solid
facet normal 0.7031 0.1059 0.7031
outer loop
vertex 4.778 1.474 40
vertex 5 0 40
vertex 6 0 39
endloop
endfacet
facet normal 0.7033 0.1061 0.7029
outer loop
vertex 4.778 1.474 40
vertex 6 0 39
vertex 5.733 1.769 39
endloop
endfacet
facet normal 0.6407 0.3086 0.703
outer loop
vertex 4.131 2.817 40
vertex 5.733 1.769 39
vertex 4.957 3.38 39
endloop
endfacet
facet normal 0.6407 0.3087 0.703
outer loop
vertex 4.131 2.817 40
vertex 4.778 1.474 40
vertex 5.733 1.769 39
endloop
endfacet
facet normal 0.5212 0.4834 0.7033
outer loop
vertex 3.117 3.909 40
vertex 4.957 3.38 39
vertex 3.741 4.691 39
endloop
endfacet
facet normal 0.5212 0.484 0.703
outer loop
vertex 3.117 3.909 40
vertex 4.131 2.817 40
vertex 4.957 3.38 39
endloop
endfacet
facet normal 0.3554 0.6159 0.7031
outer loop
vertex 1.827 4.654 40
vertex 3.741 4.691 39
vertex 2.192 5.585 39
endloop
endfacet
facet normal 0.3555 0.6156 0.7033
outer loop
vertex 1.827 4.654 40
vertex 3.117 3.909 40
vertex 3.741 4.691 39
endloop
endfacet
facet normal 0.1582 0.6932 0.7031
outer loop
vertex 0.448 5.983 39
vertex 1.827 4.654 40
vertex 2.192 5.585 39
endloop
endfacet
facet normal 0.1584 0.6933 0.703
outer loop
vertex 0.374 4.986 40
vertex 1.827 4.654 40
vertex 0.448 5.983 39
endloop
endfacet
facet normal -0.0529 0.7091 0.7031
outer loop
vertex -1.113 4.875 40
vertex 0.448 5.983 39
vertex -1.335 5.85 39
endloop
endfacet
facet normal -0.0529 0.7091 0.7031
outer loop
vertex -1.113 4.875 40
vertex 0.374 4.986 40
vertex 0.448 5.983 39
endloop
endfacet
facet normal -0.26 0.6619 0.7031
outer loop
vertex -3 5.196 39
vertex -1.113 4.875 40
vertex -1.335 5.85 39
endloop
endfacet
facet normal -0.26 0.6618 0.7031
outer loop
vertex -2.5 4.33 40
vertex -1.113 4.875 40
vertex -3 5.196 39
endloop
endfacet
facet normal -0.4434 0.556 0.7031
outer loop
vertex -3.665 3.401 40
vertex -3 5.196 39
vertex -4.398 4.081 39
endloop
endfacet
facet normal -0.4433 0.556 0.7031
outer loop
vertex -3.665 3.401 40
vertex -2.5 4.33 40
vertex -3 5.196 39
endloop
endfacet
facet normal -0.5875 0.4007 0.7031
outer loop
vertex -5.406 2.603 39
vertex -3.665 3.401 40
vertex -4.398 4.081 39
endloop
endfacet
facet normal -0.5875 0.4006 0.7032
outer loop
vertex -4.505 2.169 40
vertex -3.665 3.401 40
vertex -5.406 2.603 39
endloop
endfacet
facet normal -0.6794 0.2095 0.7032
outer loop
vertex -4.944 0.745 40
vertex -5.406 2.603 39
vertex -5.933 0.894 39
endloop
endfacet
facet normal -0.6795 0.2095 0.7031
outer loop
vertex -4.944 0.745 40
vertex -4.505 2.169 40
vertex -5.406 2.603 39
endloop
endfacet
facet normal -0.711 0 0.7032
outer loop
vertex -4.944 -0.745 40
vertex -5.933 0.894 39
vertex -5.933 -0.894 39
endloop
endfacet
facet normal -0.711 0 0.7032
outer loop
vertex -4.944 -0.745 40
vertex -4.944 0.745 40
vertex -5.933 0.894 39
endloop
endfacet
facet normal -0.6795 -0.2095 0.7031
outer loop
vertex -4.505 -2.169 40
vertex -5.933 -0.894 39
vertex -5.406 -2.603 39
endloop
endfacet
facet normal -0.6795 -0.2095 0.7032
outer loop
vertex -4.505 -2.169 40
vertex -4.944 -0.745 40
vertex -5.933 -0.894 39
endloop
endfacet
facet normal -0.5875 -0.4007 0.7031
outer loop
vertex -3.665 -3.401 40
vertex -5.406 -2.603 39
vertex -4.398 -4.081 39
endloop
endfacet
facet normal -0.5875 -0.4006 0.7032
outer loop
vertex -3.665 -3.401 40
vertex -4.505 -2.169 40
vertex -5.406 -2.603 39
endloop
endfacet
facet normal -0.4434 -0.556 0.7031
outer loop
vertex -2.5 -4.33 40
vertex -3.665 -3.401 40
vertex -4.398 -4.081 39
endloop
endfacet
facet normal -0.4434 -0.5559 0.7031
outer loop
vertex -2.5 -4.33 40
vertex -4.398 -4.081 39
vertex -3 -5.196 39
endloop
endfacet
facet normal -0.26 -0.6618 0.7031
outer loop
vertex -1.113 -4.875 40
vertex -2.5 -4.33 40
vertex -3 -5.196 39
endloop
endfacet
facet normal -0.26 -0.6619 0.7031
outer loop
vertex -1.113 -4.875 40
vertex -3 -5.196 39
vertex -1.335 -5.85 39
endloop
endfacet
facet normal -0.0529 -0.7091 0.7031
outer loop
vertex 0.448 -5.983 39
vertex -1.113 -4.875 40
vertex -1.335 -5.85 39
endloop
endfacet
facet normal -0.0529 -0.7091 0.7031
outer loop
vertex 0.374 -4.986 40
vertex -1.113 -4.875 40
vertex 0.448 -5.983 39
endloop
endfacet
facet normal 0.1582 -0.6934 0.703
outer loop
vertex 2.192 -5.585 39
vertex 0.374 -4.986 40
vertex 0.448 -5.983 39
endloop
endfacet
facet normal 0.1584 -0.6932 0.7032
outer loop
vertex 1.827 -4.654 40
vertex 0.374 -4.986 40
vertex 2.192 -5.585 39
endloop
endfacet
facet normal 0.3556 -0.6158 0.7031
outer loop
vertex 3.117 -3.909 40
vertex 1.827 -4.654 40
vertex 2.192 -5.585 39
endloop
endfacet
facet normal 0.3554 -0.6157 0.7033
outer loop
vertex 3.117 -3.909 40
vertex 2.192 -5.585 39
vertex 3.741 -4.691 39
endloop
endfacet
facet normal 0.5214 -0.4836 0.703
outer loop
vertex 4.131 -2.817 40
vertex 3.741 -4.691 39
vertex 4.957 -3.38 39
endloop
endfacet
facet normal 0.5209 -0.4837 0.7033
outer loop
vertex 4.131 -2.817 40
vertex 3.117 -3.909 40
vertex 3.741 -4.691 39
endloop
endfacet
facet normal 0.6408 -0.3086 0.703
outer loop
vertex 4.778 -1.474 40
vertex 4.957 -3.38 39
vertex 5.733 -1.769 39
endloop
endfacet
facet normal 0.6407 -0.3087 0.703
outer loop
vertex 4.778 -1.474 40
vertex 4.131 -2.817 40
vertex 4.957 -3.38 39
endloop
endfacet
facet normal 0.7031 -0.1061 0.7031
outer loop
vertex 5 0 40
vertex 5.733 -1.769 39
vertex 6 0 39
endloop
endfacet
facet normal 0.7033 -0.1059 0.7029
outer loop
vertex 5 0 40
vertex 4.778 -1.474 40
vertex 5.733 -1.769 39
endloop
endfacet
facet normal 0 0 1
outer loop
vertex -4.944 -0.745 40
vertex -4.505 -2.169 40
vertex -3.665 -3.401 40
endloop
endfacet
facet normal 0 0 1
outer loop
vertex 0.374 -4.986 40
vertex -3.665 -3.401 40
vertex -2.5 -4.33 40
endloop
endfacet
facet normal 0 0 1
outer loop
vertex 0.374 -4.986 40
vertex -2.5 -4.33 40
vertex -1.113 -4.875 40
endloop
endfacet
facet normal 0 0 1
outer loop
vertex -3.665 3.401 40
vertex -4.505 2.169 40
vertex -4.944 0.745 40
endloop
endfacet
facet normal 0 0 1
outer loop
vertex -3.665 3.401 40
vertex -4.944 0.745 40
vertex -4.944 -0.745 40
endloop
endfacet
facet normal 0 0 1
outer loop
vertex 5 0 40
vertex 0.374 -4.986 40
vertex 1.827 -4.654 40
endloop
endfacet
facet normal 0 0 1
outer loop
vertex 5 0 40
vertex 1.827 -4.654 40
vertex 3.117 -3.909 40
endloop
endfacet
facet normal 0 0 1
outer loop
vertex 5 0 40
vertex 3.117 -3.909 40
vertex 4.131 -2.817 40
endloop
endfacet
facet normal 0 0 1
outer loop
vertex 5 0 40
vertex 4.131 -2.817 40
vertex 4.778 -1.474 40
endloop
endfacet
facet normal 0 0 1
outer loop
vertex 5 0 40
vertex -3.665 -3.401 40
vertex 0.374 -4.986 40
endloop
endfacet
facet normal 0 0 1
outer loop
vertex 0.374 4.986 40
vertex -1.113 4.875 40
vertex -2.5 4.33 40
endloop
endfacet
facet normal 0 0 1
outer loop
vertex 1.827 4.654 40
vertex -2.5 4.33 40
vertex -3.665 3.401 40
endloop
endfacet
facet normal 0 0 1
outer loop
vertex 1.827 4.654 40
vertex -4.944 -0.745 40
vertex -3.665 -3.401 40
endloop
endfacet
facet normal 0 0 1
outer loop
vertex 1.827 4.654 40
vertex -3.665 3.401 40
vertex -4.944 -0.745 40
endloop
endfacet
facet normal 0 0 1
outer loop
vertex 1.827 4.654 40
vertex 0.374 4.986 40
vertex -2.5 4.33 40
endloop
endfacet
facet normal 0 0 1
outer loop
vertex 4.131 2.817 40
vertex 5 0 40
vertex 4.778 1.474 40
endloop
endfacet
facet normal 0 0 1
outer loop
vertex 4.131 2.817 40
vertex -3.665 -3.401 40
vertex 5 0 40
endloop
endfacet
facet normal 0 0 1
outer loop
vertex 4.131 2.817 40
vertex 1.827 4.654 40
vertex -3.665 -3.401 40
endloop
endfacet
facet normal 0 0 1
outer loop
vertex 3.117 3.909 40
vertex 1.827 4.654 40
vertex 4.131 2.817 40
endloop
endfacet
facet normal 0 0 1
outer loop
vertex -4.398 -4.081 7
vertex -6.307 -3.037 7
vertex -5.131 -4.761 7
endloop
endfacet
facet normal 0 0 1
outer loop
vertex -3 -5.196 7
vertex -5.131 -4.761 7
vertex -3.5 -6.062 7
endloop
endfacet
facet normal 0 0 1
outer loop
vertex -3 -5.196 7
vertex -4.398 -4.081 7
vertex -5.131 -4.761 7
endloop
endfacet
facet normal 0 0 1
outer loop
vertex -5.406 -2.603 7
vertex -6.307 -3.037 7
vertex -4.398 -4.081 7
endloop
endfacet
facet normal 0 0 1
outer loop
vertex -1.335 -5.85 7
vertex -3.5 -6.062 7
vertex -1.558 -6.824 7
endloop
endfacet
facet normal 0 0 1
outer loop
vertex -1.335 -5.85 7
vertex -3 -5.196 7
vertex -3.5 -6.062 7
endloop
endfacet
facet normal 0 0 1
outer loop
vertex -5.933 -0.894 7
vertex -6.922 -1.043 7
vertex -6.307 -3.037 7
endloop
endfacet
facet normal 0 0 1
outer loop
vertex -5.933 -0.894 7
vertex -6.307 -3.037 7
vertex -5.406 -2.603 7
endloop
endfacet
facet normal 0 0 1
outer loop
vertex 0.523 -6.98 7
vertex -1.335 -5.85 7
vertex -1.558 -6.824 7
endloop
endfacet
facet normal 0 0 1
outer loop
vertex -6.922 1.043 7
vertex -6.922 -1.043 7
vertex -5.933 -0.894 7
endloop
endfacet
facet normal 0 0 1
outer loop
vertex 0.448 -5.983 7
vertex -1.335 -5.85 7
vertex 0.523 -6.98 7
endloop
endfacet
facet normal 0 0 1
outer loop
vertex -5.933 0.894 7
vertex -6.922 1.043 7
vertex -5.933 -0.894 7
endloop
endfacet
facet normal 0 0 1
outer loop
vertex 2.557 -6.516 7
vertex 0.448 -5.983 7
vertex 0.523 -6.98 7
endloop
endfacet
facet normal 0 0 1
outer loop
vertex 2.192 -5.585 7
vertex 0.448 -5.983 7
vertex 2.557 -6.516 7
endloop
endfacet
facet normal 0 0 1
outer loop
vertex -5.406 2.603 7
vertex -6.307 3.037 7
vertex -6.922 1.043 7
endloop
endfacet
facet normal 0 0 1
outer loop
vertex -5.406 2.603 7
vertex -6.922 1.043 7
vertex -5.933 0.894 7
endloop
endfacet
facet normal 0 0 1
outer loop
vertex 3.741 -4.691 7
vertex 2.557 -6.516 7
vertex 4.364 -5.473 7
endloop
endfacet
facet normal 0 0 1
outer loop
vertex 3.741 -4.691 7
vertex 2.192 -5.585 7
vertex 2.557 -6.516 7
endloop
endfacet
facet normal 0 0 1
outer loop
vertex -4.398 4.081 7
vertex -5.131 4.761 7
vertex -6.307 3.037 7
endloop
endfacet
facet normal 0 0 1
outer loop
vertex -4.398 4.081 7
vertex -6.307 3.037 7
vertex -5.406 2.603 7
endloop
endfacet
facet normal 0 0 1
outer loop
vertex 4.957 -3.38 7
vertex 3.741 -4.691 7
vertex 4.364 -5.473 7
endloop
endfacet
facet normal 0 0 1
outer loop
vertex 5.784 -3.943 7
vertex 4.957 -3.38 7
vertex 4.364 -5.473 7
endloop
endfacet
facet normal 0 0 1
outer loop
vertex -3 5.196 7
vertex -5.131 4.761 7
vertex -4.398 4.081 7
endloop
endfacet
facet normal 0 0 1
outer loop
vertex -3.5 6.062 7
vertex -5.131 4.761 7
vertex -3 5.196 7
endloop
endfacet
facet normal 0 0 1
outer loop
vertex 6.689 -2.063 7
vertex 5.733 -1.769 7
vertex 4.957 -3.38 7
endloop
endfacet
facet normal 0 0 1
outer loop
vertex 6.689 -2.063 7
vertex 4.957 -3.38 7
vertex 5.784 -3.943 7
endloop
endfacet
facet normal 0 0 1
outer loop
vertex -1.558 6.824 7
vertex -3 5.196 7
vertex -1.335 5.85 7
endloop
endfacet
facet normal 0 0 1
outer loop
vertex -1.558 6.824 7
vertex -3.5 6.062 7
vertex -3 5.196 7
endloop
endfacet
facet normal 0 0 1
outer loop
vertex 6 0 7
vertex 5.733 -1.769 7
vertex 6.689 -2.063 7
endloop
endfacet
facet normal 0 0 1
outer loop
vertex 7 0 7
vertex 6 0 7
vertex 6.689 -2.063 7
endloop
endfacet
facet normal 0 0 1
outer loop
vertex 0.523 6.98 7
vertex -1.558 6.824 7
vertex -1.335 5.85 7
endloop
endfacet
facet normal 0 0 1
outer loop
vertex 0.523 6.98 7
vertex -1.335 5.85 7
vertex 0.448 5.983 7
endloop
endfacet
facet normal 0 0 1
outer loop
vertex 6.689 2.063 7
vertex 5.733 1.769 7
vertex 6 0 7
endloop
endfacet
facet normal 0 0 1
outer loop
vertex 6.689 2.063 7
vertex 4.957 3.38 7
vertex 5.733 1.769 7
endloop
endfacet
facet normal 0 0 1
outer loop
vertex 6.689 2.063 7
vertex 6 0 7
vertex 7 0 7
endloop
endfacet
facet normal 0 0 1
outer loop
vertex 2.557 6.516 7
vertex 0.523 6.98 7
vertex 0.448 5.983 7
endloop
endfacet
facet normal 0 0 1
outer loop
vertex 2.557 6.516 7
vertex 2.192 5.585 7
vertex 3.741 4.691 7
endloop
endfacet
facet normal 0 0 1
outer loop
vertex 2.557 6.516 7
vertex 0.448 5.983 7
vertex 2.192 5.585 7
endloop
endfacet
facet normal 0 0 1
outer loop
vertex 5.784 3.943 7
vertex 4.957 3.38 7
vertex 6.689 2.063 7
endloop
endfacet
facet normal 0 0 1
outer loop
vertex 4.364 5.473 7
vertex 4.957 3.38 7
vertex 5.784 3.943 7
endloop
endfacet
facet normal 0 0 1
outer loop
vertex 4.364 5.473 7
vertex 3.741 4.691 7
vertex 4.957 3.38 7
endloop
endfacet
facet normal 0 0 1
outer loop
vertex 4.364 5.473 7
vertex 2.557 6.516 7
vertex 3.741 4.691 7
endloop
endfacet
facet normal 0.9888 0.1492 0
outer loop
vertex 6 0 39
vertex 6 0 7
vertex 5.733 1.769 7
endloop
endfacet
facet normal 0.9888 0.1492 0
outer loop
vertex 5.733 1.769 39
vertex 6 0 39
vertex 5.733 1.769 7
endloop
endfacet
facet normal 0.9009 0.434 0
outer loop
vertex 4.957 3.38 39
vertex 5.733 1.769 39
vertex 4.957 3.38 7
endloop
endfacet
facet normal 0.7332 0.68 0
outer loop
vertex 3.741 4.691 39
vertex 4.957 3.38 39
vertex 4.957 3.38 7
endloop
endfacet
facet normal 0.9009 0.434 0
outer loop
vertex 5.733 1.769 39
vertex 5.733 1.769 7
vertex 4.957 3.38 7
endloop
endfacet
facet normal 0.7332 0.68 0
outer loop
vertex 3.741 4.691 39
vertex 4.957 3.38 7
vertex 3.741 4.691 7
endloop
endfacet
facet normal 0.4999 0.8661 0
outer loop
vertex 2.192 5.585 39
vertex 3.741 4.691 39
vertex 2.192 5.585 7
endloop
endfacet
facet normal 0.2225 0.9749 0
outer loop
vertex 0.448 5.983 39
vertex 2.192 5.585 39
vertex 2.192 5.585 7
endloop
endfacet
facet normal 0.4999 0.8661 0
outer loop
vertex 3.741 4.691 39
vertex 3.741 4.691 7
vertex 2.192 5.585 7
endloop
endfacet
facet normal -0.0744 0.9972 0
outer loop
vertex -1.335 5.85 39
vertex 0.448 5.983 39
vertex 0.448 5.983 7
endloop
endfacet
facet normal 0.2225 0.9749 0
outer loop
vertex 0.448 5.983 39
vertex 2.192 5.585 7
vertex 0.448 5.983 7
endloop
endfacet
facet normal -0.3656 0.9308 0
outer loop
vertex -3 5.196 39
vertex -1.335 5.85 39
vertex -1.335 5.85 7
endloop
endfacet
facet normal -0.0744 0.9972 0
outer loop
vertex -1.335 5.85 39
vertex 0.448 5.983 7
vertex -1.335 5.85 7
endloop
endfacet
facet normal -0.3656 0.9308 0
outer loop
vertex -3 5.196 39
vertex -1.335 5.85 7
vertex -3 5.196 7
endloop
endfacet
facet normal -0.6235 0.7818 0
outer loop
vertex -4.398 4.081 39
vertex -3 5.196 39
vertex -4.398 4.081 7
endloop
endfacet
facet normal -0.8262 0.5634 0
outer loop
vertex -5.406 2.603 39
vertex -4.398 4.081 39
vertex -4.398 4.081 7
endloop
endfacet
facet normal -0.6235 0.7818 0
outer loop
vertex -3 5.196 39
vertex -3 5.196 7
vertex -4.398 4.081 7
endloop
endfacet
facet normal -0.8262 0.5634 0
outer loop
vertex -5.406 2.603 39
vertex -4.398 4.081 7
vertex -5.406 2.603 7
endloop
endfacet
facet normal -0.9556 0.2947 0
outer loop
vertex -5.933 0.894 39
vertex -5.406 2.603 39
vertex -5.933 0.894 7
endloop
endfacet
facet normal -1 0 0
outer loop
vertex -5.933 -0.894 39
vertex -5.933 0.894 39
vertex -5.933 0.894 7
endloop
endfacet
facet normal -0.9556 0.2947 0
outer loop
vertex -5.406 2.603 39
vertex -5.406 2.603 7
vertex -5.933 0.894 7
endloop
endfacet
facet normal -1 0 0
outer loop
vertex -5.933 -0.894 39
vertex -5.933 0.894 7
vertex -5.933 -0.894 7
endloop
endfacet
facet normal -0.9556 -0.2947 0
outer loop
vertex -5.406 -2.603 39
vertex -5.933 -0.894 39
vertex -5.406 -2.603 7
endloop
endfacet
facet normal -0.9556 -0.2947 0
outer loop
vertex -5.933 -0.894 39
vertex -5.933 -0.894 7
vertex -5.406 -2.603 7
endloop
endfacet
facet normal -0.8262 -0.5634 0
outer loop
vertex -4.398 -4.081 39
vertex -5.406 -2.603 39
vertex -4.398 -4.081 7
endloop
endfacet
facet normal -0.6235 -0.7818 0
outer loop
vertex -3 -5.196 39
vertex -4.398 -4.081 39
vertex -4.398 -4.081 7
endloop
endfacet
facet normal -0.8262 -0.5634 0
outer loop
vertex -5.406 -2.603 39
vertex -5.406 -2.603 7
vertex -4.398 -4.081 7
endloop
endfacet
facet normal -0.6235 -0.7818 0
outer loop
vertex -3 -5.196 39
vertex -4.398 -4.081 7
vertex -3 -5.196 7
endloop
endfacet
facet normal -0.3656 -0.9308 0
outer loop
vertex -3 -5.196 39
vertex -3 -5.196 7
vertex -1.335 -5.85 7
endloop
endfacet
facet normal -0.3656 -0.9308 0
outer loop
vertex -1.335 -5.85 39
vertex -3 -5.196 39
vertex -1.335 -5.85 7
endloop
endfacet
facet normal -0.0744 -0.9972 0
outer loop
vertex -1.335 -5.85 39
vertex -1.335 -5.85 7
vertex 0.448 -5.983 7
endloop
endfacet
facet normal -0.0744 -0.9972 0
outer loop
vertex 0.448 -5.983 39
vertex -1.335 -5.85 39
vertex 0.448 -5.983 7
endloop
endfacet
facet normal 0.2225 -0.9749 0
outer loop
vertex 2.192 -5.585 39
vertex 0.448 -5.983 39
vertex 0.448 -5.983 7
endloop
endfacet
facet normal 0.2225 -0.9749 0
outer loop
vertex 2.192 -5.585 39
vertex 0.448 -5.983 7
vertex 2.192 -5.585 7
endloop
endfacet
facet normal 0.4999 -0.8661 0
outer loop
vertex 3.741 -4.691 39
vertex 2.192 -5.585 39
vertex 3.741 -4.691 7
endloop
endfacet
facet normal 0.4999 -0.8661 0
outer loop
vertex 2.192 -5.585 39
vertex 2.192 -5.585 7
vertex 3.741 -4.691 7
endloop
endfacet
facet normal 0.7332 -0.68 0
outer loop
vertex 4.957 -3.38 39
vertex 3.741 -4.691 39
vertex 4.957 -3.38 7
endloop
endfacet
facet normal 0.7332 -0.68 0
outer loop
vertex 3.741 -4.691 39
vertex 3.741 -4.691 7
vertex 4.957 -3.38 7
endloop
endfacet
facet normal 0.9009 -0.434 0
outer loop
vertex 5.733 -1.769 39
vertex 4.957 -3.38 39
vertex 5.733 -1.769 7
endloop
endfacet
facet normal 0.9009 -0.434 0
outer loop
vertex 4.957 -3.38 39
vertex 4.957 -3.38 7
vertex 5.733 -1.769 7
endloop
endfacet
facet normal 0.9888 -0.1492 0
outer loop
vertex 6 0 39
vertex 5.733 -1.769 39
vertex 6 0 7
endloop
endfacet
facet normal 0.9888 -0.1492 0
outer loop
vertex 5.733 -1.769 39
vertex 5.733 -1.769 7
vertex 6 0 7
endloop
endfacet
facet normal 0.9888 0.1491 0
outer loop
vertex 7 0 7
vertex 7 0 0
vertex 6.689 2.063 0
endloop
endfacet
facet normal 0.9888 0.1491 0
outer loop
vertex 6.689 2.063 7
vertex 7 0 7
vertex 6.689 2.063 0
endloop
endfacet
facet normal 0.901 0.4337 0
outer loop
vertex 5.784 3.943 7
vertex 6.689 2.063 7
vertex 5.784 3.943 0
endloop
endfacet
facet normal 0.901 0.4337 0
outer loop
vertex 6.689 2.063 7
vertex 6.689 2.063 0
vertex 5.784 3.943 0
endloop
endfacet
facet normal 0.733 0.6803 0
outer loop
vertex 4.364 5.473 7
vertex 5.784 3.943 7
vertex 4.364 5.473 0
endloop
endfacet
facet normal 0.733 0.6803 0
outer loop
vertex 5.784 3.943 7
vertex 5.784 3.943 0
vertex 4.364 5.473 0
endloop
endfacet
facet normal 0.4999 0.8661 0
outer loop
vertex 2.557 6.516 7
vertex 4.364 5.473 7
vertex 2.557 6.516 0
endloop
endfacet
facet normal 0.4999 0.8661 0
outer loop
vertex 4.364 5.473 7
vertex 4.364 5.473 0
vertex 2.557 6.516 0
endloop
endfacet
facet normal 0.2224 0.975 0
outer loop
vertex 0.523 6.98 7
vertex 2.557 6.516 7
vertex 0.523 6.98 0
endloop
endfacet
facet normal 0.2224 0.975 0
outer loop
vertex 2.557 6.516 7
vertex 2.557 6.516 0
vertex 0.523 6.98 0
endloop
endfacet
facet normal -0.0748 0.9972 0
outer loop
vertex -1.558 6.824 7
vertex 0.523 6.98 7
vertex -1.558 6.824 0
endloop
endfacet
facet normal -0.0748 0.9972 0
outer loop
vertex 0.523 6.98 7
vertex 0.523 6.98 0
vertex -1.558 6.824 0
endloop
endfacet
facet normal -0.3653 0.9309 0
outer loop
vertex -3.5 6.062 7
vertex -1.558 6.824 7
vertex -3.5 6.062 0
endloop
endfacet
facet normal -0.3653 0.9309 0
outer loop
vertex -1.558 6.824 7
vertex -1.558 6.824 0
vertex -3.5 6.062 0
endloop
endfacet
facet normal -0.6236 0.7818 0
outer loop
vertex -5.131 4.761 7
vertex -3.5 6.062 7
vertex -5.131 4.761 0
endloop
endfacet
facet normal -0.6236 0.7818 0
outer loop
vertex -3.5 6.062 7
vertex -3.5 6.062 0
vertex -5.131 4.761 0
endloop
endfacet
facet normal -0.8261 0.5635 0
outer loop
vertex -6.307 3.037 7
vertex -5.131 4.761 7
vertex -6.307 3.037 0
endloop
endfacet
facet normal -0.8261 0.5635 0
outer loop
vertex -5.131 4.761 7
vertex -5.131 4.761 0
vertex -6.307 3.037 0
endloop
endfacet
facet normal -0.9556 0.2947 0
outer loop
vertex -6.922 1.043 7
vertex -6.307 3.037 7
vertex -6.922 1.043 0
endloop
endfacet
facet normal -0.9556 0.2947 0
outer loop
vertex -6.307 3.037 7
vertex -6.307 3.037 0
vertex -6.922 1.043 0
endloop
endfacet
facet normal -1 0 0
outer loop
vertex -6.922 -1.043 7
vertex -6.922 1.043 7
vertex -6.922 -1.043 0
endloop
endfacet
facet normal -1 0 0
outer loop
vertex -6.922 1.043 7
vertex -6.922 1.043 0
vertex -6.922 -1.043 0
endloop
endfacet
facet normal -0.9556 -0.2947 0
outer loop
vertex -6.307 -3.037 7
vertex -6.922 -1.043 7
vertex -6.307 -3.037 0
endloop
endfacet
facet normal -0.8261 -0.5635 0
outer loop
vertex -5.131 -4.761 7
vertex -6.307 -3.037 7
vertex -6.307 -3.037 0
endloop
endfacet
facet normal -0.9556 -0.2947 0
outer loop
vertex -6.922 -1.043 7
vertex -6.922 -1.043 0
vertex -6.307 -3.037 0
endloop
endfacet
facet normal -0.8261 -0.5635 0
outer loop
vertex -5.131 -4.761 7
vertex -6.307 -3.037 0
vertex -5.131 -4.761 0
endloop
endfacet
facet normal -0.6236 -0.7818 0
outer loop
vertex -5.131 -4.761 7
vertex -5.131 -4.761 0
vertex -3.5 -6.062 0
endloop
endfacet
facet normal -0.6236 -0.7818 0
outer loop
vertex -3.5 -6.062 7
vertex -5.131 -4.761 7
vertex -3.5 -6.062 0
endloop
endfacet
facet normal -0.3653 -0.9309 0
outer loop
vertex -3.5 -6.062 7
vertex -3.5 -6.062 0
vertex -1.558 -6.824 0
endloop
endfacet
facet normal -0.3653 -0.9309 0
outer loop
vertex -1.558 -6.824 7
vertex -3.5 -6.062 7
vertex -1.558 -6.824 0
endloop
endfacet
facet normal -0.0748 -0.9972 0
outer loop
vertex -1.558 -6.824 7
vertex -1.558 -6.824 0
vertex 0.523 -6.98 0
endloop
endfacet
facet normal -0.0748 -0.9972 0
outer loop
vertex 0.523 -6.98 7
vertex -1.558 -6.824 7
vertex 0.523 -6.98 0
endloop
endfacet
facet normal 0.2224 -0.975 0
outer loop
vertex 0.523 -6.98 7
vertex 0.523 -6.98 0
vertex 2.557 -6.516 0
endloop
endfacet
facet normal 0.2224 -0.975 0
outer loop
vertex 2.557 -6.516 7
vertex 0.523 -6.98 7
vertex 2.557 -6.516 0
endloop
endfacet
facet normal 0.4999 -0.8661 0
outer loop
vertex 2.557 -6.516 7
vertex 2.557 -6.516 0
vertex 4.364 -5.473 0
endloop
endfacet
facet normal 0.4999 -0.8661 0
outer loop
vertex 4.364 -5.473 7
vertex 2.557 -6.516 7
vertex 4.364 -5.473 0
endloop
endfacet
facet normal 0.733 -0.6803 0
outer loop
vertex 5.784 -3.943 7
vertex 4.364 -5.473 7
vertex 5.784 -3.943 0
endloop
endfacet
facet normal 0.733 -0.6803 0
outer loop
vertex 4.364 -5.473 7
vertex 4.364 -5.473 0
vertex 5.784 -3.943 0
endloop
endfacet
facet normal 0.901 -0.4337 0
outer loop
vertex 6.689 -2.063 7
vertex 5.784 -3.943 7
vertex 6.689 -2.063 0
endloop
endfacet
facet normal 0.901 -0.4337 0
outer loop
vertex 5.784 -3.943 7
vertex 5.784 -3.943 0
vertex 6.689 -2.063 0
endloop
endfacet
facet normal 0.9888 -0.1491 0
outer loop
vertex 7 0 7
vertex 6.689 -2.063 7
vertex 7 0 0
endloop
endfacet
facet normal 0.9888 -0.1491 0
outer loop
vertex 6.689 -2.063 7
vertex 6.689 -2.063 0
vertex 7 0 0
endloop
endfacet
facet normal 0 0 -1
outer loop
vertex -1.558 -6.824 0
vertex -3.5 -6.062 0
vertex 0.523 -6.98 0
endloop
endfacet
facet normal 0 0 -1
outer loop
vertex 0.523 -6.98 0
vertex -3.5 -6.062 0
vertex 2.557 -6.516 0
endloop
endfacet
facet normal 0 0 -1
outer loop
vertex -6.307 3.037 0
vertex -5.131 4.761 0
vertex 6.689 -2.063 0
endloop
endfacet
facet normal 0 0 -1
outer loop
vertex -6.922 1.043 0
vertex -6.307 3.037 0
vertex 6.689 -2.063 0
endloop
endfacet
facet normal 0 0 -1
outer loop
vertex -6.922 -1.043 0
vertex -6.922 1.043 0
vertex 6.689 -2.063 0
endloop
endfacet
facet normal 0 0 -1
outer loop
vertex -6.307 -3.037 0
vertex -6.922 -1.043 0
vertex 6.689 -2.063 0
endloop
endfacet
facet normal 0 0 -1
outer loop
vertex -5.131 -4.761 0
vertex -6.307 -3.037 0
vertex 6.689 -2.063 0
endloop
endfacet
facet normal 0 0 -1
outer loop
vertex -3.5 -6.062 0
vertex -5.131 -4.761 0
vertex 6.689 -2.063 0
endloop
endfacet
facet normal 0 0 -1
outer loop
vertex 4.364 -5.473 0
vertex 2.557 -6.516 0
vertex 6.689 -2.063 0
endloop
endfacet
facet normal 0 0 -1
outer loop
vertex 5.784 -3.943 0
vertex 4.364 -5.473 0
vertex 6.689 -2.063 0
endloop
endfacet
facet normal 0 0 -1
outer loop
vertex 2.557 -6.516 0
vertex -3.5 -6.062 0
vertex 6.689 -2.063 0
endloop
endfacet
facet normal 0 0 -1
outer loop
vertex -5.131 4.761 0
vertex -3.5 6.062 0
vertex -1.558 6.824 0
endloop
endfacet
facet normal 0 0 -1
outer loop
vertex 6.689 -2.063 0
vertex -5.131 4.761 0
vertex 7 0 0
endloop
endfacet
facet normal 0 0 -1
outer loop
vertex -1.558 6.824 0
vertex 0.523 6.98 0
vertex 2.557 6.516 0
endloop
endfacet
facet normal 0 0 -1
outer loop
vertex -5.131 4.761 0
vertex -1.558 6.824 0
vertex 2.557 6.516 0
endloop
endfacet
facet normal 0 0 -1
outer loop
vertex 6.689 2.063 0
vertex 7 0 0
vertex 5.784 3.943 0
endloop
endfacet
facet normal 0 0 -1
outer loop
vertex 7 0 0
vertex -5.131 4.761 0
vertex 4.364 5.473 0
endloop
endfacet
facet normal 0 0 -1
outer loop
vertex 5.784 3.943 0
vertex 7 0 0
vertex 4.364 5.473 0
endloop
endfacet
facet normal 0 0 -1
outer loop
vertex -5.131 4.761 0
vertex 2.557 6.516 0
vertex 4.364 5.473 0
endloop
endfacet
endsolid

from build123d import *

# Parameters (mm, degrees)
SKETCH1_R           = 7
BOSS_EXTRUDE1_DEPTH = 7
SKETCH2_R           = 6
BOSS_EXTRUDE2_DEPTH = 33
CHAMFER1_SIZE       = 1


with BuildPart() as part:
    # Sketch1 → Boss-Extrude1 (new body)
    with BuildSketch(Plane.XY):
        Circle(SKETCH1_R)
    extrude(amount=BOSS_EXTRUDE1_DEPTH)

    # Sketch2 → Boss-Extrude2 (add)
    with BuildSketch(Plane.XY.offset(7)):
        Circle(SKETCH2_R)
    extrude(amount=BOSS_EXTRUDE2_DEPTH)

    # Chamfer1
    chamfer1_edges = [part.edges().sort_by_distance(p)[0] for p in [
        (-6, 0, 40),
    ]]
    chamfer(chamfer1_edges, length=CHAMFER1_SIZE)


solid = part.part
